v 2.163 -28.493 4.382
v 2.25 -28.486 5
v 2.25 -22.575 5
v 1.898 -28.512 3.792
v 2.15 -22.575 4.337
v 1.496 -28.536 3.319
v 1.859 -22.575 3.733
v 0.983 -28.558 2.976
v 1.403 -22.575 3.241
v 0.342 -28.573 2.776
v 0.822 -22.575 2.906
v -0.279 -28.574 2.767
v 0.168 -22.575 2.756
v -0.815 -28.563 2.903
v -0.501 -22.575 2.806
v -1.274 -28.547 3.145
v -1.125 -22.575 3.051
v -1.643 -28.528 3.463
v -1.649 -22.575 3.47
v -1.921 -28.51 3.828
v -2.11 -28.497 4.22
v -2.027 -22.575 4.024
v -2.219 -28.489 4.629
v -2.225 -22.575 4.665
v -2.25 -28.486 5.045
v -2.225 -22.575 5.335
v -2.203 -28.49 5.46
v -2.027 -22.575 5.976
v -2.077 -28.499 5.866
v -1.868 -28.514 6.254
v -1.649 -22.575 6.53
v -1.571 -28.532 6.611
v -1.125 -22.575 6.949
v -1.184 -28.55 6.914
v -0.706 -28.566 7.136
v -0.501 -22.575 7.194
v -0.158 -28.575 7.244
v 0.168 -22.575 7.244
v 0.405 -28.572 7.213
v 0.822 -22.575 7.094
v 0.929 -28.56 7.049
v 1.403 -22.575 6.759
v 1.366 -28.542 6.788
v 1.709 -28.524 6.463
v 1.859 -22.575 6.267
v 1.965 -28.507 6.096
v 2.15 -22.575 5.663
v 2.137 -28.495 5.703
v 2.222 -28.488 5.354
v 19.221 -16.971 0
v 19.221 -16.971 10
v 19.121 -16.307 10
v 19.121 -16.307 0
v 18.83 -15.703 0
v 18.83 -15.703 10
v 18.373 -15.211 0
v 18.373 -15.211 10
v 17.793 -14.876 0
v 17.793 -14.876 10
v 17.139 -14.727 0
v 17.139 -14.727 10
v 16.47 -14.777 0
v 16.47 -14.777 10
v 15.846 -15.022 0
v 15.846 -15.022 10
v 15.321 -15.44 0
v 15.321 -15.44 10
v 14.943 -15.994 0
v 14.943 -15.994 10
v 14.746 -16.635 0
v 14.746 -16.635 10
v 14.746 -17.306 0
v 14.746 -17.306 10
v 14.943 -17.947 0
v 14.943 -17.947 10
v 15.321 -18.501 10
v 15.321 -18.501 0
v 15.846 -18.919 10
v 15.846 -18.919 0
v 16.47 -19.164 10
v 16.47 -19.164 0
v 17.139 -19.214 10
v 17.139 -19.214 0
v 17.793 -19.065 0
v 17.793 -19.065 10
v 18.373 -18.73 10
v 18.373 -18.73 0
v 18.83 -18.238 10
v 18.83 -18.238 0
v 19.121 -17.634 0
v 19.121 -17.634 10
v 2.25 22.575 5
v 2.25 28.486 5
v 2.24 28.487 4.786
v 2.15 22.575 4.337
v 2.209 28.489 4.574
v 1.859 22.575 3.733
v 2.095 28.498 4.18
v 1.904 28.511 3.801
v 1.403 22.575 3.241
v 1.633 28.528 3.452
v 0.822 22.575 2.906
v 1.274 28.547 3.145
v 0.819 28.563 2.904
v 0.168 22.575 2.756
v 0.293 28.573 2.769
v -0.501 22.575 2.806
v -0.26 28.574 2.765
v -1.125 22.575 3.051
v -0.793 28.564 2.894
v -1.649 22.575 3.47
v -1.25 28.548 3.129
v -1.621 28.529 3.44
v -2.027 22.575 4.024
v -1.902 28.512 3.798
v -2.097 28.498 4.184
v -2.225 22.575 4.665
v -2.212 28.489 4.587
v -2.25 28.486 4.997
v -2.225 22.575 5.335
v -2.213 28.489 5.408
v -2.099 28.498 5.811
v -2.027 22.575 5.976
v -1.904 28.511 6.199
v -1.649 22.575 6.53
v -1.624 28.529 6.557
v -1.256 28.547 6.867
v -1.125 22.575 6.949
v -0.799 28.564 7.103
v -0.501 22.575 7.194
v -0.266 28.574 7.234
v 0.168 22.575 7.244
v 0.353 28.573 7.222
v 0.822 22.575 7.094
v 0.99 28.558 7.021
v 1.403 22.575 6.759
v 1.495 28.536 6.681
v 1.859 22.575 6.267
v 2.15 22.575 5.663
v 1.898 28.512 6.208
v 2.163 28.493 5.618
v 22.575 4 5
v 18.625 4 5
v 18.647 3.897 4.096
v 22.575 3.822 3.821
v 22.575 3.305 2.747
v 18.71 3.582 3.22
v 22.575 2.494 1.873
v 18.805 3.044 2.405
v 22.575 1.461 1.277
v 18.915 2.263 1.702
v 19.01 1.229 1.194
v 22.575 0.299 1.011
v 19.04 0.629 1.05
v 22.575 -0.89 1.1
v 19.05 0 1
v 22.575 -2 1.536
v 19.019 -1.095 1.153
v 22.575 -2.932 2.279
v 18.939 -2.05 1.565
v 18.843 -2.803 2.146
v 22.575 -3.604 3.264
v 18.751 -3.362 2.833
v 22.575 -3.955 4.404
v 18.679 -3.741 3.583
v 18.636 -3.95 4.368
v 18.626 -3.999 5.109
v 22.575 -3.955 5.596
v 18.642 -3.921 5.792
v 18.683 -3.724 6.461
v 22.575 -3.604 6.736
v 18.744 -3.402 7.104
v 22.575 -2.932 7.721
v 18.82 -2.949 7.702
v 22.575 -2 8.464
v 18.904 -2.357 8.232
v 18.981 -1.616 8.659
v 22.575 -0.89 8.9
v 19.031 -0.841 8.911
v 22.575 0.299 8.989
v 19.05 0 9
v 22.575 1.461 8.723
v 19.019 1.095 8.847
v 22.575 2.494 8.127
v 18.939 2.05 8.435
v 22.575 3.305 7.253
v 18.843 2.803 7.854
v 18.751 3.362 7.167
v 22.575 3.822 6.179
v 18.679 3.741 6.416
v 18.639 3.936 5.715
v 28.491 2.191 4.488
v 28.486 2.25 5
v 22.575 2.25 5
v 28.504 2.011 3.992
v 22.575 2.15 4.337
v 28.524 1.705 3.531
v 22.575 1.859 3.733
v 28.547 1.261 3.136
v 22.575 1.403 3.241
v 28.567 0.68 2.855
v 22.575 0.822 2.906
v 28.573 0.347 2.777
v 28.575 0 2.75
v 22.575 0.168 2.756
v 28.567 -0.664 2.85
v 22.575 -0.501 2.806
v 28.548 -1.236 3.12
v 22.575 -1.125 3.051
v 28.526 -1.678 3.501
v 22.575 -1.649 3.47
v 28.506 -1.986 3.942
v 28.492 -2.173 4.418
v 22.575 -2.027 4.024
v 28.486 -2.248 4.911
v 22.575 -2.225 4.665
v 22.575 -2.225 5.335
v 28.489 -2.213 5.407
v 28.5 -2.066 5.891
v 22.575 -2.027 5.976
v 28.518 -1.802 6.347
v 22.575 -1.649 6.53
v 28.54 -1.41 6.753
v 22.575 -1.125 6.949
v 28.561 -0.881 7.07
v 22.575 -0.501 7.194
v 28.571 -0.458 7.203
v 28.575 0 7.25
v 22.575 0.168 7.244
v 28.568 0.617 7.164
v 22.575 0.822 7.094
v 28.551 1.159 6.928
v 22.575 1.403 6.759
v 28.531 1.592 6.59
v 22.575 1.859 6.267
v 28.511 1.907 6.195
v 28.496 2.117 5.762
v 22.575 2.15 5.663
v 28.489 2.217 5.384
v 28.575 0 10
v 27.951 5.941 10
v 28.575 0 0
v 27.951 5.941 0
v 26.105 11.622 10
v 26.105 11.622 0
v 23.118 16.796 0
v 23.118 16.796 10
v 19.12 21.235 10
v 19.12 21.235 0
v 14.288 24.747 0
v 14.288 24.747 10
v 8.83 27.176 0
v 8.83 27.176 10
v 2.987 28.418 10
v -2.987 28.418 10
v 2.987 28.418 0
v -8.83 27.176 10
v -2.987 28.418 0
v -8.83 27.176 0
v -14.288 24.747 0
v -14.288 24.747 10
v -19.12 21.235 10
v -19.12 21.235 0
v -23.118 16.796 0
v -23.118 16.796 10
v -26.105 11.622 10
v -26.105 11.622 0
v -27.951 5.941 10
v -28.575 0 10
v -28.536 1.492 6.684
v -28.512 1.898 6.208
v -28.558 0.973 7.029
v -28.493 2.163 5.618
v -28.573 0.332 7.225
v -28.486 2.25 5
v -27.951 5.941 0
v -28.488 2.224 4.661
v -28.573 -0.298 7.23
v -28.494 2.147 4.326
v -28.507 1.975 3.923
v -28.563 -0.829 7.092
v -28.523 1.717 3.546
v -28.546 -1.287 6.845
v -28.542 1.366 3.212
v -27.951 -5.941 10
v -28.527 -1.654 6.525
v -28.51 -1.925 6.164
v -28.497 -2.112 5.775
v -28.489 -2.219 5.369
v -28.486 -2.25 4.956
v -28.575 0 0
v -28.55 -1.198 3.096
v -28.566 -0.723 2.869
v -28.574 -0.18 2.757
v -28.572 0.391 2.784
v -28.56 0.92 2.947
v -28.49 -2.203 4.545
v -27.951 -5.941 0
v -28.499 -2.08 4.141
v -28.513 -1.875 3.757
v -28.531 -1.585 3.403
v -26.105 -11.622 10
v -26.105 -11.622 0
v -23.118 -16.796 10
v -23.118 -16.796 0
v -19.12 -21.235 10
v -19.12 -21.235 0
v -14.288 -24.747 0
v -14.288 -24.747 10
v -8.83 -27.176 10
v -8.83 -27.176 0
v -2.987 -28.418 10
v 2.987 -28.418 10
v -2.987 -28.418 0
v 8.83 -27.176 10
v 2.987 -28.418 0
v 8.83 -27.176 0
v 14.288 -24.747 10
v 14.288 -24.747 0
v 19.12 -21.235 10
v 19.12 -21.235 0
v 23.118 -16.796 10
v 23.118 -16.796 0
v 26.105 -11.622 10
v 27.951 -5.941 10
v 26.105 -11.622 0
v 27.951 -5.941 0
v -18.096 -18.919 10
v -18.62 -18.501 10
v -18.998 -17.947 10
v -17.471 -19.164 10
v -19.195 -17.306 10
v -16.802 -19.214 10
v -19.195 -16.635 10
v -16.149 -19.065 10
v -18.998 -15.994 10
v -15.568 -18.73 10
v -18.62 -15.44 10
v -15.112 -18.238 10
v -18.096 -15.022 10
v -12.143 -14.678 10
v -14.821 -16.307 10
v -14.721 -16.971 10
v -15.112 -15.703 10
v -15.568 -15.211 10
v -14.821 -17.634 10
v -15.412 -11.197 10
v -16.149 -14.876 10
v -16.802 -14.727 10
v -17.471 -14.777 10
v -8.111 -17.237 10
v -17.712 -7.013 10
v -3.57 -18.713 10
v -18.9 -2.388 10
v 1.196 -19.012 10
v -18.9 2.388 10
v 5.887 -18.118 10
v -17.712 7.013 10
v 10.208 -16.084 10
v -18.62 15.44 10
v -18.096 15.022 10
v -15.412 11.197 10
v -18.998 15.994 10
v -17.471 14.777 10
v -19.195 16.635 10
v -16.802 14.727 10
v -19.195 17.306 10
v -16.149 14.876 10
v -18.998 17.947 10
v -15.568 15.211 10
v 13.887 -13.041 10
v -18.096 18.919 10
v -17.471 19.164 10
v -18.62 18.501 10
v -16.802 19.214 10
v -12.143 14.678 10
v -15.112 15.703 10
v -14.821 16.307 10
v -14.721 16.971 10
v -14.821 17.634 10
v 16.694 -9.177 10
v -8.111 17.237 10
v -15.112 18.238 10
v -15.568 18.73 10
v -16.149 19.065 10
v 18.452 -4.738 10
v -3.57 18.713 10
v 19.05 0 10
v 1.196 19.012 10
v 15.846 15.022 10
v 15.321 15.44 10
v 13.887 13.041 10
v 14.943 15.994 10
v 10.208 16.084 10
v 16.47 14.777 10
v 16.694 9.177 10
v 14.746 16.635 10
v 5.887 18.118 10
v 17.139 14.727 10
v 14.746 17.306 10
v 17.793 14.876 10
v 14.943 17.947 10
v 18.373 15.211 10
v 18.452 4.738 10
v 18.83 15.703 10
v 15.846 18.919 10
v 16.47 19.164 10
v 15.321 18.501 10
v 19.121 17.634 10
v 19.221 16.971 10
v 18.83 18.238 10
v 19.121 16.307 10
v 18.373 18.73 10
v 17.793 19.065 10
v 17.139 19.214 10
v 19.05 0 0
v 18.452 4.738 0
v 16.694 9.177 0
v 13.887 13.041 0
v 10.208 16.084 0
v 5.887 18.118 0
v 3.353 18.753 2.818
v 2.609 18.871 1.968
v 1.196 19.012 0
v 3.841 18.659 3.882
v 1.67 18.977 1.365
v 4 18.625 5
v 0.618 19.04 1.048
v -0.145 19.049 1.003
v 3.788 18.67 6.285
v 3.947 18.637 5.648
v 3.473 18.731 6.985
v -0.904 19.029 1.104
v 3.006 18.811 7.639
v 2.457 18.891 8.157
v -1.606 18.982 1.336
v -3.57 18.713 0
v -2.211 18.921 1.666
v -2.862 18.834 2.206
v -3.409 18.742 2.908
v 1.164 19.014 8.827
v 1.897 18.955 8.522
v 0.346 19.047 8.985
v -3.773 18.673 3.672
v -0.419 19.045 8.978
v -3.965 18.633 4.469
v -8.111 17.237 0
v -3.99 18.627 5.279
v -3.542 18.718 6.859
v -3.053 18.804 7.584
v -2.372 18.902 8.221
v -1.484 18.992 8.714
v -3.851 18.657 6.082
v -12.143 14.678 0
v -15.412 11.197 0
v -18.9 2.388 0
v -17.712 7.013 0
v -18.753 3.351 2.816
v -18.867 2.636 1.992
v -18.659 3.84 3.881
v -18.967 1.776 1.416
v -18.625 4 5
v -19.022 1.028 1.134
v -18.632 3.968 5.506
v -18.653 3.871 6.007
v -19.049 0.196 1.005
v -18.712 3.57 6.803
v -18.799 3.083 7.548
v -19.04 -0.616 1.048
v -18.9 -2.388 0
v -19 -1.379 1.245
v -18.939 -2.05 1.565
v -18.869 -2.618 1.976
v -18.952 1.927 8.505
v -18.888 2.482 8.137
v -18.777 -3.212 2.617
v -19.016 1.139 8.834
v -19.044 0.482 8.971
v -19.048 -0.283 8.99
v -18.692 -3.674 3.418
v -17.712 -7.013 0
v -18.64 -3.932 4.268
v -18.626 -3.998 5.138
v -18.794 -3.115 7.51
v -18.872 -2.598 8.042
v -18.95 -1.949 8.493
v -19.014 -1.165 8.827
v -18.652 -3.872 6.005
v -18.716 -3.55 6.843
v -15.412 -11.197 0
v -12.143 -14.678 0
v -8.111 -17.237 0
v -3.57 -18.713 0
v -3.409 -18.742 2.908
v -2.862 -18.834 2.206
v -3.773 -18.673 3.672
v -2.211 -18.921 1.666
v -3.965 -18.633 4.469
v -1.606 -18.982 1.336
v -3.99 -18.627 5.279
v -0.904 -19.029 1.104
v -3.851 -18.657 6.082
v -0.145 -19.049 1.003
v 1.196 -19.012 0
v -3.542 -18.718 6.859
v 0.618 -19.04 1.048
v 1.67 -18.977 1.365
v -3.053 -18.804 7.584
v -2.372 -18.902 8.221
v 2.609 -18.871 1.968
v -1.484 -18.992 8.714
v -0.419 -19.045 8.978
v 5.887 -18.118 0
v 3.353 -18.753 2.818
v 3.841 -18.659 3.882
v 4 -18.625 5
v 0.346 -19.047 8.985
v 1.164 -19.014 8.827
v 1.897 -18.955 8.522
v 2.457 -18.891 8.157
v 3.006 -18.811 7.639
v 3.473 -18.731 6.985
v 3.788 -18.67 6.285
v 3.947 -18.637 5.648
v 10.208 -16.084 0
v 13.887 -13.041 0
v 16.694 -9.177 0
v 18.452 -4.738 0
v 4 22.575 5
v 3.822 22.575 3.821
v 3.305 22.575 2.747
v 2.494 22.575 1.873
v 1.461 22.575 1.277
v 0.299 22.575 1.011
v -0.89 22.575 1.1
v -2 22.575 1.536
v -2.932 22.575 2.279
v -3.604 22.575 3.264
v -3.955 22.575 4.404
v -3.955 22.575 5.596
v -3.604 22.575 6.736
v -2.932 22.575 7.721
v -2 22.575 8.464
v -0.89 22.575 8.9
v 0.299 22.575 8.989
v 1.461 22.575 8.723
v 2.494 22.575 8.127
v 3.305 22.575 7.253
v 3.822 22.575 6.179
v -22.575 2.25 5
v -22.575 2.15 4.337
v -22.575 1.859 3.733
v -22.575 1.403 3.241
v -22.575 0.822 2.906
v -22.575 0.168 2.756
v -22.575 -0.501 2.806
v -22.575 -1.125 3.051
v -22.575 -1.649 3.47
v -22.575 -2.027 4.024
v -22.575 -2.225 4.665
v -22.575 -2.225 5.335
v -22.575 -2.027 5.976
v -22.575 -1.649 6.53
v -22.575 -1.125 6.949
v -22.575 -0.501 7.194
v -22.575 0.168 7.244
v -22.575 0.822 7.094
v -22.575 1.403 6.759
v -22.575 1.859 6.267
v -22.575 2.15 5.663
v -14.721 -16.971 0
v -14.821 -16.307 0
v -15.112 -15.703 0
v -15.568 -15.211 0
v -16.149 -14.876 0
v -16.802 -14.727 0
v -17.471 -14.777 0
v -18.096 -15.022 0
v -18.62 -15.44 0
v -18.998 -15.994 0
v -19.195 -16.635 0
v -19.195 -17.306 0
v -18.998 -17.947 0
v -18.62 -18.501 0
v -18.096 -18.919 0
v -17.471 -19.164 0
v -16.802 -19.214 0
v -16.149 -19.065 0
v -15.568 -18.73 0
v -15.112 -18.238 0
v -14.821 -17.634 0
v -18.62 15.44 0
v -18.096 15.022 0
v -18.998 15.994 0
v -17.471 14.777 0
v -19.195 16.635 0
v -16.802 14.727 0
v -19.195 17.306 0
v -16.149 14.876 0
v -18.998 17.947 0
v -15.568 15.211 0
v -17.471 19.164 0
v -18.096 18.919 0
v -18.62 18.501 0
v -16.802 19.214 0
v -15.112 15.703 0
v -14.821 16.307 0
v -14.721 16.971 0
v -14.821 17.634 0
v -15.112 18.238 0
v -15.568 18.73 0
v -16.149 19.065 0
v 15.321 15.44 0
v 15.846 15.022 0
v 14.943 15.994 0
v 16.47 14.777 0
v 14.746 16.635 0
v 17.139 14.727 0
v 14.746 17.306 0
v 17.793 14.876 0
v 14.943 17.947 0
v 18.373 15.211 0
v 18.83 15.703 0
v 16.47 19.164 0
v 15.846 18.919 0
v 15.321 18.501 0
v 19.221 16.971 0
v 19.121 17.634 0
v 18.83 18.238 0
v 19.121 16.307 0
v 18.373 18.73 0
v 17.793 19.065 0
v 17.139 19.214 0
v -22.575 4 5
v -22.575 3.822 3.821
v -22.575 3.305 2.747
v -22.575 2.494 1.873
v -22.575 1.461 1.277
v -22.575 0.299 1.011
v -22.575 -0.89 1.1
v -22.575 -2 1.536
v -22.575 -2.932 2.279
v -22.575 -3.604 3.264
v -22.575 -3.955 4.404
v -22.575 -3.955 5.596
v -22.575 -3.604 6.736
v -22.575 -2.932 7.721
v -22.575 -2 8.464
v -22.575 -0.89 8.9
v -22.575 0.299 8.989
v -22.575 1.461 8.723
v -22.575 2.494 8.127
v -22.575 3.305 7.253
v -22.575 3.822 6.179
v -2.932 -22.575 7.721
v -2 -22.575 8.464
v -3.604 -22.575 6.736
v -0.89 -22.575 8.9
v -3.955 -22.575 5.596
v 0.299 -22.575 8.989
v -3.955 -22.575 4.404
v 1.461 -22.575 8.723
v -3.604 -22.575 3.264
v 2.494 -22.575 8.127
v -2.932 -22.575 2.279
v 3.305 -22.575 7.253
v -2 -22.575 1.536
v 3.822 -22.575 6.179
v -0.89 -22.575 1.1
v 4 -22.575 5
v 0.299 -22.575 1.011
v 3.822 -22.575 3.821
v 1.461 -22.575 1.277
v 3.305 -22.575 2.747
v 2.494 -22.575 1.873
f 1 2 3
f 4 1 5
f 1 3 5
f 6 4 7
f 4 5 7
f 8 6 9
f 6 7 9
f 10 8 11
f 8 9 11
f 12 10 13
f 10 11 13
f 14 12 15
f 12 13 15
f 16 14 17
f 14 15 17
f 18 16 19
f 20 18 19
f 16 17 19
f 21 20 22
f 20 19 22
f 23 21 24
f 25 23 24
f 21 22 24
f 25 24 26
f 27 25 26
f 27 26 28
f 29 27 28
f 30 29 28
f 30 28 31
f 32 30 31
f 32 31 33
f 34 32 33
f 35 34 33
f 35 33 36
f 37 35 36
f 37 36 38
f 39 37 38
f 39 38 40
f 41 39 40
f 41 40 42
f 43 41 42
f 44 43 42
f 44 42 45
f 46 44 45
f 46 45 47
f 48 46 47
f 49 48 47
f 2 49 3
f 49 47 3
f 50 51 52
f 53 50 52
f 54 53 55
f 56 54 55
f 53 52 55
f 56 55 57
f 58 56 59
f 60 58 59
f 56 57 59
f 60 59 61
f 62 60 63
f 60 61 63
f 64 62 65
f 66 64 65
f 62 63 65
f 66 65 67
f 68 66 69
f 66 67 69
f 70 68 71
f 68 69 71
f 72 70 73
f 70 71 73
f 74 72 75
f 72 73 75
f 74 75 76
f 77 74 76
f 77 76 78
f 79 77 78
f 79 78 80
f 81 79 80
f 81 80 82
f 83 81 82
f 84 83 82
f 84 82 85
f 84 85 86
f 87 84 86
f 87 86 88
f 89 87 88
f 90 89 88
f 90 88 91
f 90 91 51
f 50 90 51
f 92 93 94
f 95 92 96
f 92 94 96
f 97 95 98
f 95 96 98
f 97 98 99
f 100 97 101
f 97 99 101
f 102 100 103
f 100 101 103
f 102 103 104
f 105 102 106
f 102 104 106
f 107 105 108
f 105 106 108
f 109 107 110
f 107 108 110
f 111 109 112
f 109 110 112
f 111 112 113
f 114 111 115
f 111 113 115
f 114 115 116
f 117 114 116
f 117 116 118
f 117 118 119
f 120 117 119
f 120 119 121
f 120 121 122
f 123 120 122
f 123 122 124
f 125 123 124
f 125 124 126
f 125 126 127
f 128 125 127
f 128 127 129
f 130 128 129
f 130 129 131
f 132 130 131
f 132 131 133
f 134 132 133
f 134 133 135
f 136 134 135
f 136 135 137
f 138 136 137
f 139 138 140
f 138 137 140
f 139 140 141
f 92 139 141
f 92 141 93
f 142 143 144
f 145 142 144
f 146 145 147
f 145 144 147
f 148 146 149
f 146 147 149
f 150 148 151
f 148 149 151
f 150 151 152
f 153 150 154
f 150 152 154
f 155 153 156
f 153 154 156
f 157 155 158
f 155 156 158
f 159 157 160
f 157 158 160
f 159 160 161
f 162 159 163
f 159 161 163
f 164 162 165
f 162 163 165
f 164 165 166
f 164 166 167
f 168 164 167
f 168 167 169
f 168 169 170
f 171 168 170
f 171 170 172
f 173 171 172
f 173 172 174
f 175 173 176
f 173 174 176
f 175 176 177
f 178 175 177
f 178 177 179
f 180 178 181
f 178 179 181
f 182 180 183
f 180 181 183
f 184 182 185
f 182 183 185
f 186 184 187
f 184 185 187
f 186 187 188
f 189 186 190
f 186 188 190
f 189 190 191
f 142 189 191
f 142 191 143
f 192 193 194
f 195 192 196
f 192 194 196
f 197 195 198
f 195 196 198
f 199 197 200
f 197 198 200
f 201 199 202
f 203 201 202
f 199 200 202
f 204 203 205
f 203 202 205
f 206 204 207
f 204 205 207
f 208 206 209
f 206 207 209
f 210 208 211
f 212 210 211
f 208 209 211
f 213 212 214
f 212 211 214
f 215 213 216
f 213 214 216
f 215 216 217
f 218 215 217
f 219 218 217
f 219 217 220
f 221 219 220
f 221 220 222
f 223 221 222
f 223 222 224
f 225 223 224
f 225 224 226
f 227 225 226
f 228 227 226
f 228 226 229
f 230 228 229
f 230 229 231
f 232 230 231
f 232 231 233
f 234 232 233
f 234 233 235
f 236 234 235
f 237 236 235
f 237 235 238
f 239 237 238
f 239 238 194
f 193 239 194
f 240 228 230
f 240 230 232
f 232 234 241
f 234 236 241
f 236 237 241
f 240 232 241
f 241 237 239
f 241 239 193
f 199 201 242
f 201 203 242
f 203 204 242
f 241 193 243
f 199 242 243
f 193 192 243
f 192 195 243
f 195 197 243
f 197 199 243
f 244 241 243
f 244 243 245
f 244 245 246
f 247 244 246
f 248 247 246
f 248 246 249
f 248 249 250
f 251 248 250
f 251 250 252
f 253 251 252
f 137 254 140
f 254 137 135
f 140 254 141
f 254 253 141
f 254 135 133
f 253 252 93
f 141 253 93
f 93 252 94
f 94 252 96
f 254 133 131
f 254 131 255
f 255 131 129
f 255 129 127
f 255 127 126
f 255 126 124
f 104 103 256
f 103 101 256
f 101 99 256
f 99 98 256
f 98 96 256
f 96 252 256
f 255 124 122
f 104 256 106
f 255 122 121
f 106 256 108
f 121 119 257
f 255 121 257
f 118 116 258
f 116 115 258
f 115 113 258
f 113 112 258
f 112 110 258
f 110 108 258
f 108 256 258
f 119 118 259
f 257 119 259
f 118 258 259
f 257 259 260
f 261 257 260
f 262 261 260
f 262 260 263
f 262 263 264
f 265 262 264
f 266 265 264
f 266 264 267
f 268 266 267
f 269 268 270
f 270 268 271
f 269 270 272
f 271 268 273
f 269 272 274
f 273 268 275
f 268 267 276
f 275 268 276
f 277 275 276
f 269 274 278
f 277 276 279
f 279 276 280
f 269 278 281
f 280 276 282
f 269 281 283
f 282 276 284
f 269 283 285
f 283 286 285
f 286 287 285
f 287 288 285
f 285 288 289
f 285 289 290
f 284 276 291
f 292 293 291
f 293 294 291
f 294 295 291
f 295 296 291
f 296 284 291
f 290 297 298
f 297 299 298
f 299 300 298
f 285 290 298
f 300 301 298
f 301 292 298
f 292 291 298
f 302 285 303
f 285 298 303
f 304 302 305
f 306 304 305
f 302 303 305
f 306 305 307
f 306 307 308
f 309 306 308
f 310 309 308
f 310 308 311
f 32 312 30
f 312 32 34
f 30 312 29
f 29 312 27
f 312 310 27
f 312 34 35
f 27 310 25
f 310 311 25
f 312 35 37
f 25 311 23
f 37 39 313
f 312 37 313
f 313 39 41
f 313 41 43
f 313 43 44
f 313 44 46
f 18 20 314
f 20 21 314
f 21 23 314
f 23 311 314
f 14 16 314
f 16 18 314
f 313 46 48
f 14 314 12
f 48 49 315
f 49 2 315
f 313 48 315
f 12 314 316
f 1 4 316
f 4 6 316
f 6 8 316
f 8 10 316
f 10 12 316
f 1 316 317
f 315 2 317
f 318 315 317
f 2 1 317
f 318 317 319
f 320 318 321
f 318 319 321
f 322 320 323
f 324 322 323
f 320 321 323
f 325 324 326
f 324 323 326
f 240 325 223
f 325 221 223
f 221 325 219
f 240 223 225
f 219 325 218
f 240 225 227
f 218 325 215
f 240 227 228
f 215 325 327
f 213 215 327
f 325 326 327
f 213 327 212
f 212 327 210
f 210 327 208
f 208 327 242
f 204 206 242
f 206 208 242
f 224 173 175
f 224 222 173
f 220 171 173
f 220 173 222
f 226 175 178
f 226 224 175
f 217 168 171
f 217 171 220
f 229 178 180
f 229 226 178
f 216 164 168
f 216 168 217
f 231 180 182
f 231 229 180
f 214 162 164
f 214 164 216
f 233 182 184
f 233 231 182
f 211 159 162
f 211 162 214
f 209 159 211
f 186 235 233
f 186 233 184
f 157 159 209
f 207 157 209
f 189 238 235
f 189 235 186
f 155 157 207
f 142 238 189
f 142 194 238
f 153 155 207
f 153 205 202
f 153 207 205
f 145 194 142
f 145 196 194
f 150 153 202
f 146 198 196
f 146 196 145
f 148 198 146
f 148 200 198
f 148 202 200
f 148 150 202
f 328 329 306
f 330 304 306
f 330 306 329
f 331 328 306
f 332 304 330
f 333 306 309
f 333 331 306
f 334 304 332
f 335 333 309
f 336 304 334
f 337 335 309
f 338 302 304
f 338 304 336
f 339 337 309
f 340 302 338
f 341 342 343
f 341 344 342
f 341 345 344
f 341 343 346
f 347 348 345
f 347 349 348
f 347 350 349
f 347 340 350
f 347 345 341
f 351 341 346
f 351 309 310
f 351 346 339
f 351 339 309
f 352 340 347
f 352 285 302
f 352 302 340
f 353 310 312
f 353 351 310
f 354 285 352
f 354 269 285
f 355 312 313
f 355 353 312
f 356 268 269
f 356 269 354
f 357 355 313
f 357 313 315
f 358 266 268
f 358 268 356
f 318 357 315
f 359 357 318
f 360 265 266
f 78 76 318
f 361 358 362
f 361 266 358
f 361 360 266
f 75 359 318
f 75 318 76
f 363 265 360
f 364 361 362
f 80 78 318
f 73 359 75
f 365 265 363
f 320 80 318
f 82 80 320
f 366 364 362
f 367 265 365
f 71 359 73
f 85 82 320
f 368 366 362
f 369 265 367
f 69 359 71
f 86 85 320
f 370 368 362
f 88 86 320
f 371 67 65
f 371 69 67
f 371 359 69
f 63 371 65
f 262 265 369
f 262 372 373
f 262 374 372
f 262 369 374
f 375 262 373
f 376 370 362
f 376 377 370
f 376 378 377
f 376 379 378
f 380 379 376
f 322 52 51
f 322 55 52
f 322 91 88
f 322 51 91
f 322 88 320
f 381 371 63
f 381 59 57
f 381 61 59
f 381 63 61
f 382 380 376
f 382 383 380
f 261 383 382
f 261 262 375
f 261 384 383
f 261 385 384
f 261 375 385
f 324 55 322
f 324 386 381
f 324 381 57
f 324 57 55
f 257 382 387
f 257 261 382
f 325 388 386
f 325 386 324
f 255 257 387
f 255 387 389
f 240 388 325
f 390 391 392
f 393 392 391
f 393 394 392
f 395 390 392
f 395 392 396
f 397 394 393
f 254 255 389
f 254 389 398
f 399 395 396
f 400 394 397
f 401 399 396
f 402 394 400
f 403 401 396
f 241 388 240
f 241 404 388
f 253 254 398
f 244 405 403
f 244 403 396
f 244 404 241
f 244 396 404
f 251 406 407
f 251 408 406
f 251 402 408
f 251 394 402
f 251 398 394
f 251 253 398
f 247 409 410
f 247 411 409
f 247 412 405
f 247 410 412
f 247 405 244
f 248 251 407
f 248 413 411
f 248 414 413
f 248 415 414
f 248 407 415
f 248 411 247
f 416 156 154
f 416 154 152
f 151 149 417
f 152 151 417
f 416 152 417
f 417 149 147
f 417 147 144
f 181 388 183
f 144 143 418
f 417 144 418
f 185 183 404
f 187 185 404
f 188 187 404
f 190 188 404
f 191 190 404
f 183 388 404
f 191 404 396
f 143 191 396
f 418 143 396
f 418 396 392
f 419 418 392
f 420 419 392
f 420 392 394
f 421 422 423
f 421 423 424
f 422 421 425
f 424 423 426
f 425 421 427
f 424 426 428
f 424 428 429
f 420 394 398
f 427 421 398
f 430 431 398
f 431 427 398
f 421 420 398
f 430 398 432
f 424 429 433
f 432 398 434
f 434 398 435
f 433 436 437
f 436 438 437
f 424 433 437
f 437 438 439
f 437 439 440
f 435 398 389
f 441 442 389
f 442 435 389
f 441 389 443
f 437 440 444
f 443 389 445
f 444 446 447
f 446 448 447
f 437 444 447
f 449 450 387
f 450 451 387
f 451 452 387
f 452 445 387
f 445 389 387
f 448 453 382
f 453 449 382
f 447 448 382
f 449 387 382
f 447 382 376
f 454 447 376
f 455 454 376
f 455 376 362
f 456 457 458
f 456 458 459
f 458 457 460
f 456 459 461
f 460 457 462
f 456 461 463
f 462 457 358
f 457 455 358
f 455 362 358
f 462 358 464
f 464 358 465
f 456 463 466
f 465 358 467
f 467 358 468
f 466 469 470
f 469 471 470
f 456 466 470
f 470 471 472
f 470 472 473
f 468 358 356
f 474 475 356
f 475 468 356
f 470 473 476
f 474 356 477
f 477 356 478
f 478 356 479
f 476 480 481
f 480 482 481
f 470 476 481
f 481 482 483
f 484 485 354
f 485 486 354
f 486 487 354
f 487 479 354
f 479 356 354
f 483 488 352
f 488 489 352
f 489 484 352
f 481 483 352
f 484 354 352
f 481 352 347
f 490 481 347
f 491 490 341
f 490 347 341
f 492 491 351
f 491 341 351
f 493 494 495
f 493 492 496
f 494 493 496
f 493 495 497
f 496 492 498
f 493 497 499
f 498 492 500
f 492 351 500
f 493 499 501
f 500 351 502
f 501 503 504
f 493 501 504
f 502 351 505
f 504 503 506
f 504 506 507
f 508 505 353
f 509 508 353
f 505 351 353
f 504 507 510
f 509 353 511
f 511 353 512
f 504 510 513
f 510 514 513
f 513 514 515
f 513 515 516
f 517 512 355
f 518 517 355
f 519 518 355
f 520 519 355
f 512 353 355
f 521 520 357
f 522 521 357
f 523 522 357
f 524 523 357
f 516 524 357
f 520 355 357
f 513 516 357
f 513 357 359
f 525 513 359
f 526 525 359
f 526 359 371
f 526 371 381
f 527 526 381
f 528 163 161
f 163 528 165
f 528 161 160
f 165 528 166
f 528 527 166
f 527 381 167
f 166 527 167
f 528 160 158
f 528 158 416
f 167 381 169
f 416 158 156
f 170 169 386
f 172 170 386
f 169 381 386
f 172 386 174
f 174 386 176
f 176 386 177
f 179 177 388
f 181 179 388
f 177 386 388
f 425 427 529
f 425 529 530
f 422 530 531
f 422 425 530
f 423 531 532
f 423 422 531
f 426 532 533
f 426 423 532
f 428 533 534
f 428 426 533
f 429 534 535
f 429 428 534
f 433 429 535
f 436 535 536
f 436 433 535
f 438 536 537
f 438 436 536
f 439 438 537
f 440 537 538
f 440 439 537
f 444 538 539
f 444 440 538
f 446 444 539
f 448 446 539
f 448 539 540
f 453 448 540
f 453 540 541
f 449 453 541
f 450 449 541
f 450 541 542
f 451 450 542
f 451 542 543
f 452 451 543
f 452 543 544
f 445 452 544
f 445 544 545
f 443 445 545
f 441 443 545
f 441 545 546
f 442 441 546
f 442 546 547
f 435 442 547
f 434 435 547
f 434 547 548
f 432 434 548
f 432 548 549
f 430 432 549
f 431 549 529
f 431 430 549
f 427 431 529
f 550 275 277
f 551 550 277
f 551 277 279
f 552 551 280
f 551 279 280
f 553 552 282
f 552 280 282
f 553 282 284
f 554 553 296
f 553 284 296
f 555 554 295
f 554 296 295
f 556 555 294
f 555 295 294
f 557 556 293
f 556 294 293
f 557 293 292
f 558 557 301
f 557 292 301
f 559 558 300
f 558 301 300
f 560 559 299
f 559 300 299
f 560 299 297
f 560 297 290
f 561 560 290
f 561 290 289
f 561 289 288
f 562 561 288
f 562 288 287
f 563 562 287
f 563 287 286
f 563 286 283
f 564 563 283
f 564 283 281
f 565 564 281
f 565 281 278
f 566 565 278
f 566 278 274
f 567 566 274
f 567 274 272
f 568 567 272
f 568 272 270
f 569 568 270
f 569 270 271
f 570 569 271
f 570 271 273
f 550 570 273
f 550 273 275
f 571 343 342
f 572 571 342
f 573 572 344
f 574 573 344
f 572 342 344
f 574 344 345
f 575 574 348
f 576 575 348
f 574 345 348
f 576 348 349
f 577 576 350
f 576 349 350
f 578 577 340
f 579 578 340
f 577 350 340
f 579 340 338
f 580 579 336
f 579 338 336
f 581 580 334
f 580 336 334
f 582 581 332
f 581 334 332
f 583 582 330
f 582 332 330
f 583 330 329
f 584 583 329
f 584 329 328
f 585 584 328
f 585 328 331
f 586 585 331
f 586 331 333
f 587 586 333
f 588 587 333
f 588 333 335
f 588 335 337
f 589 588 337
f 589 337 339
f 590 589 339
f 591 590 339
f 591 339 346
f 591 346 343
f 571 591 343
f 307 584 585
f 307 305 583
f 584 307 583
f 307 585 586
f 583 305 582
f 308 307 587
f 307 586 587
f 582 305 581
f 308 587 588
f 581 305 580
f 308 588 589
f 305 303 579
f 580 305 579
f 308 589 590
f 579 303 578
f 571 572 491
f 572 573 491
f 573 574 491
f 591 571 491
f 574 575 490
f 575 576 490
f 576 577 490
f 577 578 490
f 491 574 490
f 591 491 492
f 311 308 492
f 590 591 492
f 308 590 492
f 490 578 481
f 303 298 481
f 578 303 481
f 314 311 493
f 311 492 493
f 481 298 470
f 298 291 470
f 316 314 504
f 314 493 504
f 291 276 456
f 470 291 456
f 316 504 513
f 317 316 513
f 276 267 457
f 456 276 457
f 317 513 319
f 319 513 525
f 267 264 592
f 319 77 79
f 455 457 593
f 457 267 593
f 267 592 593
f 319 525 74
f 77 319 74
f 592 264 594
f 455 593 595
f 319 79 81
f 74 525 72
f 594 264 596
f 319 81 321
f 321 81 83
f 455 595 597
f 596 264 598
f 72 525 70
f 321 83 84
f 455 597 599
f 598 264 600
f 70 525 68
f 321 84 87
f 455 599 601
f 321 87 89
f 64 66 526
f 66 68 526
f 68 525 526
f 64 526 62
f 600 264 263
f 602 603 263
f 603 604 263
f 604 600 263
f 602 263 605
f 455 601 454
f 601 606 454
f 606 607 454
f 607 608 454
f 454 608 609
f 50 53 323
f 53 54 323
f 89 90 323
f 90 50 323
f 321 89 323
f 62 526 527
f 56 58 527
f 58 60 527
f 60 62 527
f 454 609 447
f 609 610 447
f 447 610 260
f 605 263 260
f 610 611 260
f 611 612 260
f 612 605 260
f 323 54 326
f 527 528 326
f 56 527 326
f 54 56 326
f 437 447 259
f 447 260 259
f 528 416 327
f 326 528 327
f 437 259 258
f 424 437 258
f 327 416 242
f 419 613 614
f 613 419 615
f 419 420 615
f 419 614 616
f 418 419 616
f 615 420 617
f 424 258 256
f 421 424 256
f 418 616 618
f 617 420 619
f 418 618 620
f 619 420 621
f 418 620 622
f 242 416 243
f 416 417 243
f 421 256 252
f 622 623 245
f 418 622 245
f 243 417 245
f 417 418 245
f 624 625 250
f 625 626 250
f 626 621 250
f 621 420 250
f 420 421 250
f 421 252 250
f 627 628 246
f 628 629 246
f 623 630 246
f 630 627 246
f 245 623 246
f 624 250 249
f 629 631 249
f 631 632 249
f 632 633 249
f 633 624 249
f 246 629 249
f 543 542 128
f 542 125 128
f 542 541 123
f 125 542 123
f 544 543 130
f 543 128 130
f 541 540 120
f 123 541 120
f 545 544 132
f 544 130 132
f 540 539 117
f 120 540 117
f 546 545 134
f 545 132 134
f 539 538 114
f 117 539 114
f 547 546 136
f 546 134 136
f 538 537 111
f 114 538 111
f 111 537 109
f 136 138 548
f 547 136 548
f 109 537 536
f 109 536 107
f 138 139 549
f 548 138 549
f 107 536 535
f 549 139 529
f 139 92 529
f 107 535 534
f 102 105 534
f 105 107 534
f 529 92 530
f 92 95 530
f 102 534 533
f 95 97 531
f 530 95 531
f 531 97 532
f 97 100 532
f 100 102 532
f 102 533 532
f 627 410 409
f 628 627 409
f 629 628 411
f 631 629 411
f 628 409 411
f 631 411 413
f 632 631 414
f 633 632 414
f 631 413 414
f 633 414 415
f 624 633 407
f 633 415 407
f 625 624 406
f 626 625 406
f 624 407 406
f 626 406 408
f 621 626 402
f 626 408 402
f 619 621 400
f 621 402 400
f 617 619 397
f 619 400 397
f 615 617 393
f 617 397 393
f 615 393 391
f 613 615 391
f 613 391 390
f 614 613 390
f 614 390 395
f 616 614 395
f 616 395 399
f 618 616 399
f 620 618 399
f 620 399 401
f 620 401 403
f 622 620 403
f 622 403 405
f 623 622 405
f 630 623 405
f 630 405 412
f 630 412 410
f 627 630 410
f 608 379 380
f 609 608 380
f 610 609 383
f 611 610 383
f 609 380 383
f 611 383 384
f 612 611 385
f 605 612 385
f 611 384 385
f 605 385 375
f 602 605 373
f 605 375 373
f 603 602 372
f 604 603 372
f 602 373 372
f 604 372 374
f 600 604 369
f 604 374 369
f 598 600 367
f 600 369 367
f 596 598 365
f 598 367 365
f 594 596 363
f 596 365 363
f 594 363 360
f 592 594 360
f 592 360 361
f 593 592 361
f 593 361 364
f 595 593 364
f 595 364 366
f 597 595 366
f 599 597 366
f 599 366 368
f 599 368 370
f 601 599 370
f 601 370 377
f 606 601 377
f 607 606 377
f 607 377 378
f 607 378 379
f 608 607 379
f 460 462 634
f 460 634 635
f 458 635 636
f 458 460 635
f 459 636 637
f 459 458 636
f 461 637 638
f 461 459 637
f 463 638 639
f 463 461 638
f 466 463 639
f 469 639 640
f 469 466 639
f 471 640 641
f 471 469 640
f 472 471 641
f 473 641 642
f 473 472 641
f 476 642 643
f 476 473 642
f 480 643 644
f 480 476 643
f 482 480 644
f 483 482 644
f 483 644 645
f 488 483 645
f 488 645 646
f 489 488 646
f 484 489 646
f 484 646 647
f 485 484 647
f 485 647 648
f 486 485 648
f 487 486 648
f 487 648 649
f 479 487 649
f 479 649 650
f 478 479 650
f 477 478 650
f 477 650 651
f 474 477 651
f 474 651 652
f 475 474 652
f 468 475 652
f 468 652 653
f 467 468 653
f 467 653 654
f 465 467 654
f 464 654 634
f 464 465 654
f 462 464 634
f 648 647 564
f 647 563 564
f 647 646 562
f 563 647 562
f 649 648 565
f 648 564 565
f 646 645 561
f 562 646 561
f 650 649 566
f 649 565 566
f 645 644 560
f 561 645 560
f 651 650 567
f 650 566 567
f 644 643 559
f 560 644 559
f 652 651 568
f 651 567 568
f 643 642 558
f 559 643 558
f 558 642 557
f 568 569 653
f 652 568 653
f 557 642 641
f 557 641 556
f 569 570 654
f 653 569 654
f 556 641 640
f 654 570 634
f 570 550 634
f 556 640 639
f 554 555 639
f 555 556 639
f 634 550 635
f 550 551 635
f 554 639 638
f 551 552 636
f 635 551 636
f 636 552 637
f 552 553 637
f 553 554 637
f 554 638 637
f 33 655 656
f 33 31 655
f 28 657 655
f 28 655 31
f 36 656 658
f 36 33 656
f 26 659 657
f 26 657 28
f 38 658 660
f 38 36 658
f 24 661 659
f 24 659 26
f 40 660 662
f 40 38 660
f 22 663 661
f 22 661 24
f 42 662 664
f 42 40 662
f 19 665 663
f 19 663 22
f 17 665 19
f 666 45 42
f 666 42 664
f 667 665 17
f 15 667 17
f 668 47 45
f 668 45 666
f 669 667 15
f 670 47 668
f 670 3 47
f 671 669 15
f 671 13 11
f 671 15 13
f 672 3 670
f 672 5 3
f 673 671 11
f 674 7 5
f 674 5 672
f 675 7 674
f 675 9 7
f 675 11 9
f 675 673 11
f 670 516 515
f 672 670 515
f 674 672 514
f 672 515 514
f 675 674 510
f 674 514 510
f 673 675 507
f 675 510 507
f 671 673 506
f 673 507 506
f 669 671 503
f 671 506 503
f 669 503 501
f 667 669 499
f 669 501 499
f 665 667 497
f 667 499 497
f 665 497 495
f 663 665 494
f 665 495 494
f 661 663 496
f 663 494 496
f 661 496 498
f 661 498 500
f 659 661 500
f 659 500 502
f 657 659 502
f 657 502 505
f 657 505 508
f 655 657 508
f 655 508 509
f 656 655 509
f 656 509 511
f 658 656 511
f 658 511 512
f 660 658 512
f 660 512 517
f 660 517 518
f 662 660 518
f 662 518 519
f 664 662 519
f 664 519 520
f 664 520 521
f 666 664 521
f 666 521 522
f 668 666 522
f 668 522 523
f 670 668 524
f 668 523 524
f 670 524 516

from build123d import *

# Parameters (mm, degrees)
SKETCH1_R           = 28.575
BOSS_EXTRUDE1_DEPTH = 10
SKETCH2_R           = 19.05
CUT_EXTRUDE1_DEPTH  = 11
SKETCH5_R           = 2.25
CUT_EXTRUDE2_DEPTH  = 58.15
SKETCH6_R           = 2.25
CUT_EXTRUDE3_DEPTH  = 11.0000001
CUT_EXTRUDE5_START  = -10
SKETCH7_R           = 4
SKETCH7_R_2         = 2.25
CUT_EXTRUDE5_DEPTH  = 4
CUT_EXTRUDE6_START  = -47.15
SKETCH7_4_R         = 4
SKETCH7_4_R_2       = 2.25
CUT_EXTRUDE6_DEPTH  = 4
CIRPATTERN6_COUNT   = 2
CIRPATTERN6_ANGLE   = 90


with BuildPart() as part:
    # Sketch1 → Boss-Extrude1 (new body)
    with BuildSketch(Plane.XY):
        Circle(SKETCH1_R)
    extrude(amount=BOSS_EXTRUDE1_DEPTH)

    # Sketch2 → Cut-Extrude1 (cut, through all)
    with BuildSketch(Plane.XY.offset(10)):
        Circle(SKETCH2_R)
    extrude(amount=-CUT_EXTRUDE1_DEPTH, mode=Mode.SUBTRACT)

    # Sketch5 → Cut-Extrude2 (cut, through all)
    with BuildSketch(Plane(origin=(0, 28.575, 0), x_dir=(1, 0, 0), z_dir=(0, 1, 0))):
        with Locations((0, -5)):
            Circle(SKETCH5_R)
    cut_extrude2 = extrude(amount=-CUT_EXTRUDE2_DEPTH, mode=Mode.SUBTRACT)

    # Sketch6 → Cut-Extrude3 (cut, through all)
    with BuildSketch(Plane.XY.offset(10)):
        with Locations((-16.970562748, 16.970562748)):
            Circle(SKETCH6_R)
        with Locations((16.970562748, 16.970562748)):
            Circle(SKETCH6_R)
        with Locations((16.970562748, -16.970562748)):
            Circle(SKETCH6_R)
        with Locations((-16.970562748, -16.970562748)):
            Circle(SKETCH6_R)
    extrude(amount=-CUT_EXTRUDE3_DEPTH, mode=Mode.SUBTRACT)

    # Sketch7 → Cut-Extrude5 (cut)
    with BuildSketch(Plane(origin=(0, 28.575, 0), x_dir=(1, 0, 0), z_dir=(0, 1, 0)).offset(CUT_EXTRUDE5_START)):
        with Locations((0, -5)):
            Circle(SKETCH7_R)
        with Locations((0, -5)):
            Circle(SKETCH7_R_2, mode=Mode.SUBTRACT)
    cut_extrude5 = extrude(amount=CUT_EXTRUDE5_DEPTH, mode=Mode.SUBTRACT)

    # Sketch7<4> → Cut-Extrude6 (cut)
    with BuildSketch(Plane(origin=(0, 28.575, 0), x_dir=(1, 0, 0), z_dir=(0, 1, 0)).offset(CUT_EXTRUDE6_START)):
        with Locations((0, -5)):
            Circle(SKETCH7_4_R)
        with Locations((0, -5)):
            Circle(SKETCH7_4_R_2, mode=Mode.SUBTRACT)
    cut_extrude6 = extrude(amount=-CUT_EXTRUDE6_DEPTH, mode=Mode.SUBTRACT)

    # CirPattern6: Cut-Extrude2, Cut-Extrude5, Cut-Extrude6 ×2 about axis
    cirpattern6_axis = Axis((0, 0, 10), (0, 0, 1))
    for i in range(1, CIRPATTERN6_COUNT):
        add(cut_extrude2.rotate(cirpattern6_axis, i * CIRPATTERN6_ANGLE / (CIRPATTERN6_COUNT - 1)), mode=Mode.SUBTRACT)
        add(cut_extrude5.rotate(cirpattern6_axis, i * CIRPATTERN6_ANGLE / (CIRPATTERN6_COUNT - 1)), mode=Mode.SUBTRACT)
        add(cut_extrude6.rotate(cirpattern6_axis, i * CIRPATTERN6_ANGLE / (CIRPATTERN6_COUNT - 1)), mode=Mode.SUBTRACT)


solid = part.part
